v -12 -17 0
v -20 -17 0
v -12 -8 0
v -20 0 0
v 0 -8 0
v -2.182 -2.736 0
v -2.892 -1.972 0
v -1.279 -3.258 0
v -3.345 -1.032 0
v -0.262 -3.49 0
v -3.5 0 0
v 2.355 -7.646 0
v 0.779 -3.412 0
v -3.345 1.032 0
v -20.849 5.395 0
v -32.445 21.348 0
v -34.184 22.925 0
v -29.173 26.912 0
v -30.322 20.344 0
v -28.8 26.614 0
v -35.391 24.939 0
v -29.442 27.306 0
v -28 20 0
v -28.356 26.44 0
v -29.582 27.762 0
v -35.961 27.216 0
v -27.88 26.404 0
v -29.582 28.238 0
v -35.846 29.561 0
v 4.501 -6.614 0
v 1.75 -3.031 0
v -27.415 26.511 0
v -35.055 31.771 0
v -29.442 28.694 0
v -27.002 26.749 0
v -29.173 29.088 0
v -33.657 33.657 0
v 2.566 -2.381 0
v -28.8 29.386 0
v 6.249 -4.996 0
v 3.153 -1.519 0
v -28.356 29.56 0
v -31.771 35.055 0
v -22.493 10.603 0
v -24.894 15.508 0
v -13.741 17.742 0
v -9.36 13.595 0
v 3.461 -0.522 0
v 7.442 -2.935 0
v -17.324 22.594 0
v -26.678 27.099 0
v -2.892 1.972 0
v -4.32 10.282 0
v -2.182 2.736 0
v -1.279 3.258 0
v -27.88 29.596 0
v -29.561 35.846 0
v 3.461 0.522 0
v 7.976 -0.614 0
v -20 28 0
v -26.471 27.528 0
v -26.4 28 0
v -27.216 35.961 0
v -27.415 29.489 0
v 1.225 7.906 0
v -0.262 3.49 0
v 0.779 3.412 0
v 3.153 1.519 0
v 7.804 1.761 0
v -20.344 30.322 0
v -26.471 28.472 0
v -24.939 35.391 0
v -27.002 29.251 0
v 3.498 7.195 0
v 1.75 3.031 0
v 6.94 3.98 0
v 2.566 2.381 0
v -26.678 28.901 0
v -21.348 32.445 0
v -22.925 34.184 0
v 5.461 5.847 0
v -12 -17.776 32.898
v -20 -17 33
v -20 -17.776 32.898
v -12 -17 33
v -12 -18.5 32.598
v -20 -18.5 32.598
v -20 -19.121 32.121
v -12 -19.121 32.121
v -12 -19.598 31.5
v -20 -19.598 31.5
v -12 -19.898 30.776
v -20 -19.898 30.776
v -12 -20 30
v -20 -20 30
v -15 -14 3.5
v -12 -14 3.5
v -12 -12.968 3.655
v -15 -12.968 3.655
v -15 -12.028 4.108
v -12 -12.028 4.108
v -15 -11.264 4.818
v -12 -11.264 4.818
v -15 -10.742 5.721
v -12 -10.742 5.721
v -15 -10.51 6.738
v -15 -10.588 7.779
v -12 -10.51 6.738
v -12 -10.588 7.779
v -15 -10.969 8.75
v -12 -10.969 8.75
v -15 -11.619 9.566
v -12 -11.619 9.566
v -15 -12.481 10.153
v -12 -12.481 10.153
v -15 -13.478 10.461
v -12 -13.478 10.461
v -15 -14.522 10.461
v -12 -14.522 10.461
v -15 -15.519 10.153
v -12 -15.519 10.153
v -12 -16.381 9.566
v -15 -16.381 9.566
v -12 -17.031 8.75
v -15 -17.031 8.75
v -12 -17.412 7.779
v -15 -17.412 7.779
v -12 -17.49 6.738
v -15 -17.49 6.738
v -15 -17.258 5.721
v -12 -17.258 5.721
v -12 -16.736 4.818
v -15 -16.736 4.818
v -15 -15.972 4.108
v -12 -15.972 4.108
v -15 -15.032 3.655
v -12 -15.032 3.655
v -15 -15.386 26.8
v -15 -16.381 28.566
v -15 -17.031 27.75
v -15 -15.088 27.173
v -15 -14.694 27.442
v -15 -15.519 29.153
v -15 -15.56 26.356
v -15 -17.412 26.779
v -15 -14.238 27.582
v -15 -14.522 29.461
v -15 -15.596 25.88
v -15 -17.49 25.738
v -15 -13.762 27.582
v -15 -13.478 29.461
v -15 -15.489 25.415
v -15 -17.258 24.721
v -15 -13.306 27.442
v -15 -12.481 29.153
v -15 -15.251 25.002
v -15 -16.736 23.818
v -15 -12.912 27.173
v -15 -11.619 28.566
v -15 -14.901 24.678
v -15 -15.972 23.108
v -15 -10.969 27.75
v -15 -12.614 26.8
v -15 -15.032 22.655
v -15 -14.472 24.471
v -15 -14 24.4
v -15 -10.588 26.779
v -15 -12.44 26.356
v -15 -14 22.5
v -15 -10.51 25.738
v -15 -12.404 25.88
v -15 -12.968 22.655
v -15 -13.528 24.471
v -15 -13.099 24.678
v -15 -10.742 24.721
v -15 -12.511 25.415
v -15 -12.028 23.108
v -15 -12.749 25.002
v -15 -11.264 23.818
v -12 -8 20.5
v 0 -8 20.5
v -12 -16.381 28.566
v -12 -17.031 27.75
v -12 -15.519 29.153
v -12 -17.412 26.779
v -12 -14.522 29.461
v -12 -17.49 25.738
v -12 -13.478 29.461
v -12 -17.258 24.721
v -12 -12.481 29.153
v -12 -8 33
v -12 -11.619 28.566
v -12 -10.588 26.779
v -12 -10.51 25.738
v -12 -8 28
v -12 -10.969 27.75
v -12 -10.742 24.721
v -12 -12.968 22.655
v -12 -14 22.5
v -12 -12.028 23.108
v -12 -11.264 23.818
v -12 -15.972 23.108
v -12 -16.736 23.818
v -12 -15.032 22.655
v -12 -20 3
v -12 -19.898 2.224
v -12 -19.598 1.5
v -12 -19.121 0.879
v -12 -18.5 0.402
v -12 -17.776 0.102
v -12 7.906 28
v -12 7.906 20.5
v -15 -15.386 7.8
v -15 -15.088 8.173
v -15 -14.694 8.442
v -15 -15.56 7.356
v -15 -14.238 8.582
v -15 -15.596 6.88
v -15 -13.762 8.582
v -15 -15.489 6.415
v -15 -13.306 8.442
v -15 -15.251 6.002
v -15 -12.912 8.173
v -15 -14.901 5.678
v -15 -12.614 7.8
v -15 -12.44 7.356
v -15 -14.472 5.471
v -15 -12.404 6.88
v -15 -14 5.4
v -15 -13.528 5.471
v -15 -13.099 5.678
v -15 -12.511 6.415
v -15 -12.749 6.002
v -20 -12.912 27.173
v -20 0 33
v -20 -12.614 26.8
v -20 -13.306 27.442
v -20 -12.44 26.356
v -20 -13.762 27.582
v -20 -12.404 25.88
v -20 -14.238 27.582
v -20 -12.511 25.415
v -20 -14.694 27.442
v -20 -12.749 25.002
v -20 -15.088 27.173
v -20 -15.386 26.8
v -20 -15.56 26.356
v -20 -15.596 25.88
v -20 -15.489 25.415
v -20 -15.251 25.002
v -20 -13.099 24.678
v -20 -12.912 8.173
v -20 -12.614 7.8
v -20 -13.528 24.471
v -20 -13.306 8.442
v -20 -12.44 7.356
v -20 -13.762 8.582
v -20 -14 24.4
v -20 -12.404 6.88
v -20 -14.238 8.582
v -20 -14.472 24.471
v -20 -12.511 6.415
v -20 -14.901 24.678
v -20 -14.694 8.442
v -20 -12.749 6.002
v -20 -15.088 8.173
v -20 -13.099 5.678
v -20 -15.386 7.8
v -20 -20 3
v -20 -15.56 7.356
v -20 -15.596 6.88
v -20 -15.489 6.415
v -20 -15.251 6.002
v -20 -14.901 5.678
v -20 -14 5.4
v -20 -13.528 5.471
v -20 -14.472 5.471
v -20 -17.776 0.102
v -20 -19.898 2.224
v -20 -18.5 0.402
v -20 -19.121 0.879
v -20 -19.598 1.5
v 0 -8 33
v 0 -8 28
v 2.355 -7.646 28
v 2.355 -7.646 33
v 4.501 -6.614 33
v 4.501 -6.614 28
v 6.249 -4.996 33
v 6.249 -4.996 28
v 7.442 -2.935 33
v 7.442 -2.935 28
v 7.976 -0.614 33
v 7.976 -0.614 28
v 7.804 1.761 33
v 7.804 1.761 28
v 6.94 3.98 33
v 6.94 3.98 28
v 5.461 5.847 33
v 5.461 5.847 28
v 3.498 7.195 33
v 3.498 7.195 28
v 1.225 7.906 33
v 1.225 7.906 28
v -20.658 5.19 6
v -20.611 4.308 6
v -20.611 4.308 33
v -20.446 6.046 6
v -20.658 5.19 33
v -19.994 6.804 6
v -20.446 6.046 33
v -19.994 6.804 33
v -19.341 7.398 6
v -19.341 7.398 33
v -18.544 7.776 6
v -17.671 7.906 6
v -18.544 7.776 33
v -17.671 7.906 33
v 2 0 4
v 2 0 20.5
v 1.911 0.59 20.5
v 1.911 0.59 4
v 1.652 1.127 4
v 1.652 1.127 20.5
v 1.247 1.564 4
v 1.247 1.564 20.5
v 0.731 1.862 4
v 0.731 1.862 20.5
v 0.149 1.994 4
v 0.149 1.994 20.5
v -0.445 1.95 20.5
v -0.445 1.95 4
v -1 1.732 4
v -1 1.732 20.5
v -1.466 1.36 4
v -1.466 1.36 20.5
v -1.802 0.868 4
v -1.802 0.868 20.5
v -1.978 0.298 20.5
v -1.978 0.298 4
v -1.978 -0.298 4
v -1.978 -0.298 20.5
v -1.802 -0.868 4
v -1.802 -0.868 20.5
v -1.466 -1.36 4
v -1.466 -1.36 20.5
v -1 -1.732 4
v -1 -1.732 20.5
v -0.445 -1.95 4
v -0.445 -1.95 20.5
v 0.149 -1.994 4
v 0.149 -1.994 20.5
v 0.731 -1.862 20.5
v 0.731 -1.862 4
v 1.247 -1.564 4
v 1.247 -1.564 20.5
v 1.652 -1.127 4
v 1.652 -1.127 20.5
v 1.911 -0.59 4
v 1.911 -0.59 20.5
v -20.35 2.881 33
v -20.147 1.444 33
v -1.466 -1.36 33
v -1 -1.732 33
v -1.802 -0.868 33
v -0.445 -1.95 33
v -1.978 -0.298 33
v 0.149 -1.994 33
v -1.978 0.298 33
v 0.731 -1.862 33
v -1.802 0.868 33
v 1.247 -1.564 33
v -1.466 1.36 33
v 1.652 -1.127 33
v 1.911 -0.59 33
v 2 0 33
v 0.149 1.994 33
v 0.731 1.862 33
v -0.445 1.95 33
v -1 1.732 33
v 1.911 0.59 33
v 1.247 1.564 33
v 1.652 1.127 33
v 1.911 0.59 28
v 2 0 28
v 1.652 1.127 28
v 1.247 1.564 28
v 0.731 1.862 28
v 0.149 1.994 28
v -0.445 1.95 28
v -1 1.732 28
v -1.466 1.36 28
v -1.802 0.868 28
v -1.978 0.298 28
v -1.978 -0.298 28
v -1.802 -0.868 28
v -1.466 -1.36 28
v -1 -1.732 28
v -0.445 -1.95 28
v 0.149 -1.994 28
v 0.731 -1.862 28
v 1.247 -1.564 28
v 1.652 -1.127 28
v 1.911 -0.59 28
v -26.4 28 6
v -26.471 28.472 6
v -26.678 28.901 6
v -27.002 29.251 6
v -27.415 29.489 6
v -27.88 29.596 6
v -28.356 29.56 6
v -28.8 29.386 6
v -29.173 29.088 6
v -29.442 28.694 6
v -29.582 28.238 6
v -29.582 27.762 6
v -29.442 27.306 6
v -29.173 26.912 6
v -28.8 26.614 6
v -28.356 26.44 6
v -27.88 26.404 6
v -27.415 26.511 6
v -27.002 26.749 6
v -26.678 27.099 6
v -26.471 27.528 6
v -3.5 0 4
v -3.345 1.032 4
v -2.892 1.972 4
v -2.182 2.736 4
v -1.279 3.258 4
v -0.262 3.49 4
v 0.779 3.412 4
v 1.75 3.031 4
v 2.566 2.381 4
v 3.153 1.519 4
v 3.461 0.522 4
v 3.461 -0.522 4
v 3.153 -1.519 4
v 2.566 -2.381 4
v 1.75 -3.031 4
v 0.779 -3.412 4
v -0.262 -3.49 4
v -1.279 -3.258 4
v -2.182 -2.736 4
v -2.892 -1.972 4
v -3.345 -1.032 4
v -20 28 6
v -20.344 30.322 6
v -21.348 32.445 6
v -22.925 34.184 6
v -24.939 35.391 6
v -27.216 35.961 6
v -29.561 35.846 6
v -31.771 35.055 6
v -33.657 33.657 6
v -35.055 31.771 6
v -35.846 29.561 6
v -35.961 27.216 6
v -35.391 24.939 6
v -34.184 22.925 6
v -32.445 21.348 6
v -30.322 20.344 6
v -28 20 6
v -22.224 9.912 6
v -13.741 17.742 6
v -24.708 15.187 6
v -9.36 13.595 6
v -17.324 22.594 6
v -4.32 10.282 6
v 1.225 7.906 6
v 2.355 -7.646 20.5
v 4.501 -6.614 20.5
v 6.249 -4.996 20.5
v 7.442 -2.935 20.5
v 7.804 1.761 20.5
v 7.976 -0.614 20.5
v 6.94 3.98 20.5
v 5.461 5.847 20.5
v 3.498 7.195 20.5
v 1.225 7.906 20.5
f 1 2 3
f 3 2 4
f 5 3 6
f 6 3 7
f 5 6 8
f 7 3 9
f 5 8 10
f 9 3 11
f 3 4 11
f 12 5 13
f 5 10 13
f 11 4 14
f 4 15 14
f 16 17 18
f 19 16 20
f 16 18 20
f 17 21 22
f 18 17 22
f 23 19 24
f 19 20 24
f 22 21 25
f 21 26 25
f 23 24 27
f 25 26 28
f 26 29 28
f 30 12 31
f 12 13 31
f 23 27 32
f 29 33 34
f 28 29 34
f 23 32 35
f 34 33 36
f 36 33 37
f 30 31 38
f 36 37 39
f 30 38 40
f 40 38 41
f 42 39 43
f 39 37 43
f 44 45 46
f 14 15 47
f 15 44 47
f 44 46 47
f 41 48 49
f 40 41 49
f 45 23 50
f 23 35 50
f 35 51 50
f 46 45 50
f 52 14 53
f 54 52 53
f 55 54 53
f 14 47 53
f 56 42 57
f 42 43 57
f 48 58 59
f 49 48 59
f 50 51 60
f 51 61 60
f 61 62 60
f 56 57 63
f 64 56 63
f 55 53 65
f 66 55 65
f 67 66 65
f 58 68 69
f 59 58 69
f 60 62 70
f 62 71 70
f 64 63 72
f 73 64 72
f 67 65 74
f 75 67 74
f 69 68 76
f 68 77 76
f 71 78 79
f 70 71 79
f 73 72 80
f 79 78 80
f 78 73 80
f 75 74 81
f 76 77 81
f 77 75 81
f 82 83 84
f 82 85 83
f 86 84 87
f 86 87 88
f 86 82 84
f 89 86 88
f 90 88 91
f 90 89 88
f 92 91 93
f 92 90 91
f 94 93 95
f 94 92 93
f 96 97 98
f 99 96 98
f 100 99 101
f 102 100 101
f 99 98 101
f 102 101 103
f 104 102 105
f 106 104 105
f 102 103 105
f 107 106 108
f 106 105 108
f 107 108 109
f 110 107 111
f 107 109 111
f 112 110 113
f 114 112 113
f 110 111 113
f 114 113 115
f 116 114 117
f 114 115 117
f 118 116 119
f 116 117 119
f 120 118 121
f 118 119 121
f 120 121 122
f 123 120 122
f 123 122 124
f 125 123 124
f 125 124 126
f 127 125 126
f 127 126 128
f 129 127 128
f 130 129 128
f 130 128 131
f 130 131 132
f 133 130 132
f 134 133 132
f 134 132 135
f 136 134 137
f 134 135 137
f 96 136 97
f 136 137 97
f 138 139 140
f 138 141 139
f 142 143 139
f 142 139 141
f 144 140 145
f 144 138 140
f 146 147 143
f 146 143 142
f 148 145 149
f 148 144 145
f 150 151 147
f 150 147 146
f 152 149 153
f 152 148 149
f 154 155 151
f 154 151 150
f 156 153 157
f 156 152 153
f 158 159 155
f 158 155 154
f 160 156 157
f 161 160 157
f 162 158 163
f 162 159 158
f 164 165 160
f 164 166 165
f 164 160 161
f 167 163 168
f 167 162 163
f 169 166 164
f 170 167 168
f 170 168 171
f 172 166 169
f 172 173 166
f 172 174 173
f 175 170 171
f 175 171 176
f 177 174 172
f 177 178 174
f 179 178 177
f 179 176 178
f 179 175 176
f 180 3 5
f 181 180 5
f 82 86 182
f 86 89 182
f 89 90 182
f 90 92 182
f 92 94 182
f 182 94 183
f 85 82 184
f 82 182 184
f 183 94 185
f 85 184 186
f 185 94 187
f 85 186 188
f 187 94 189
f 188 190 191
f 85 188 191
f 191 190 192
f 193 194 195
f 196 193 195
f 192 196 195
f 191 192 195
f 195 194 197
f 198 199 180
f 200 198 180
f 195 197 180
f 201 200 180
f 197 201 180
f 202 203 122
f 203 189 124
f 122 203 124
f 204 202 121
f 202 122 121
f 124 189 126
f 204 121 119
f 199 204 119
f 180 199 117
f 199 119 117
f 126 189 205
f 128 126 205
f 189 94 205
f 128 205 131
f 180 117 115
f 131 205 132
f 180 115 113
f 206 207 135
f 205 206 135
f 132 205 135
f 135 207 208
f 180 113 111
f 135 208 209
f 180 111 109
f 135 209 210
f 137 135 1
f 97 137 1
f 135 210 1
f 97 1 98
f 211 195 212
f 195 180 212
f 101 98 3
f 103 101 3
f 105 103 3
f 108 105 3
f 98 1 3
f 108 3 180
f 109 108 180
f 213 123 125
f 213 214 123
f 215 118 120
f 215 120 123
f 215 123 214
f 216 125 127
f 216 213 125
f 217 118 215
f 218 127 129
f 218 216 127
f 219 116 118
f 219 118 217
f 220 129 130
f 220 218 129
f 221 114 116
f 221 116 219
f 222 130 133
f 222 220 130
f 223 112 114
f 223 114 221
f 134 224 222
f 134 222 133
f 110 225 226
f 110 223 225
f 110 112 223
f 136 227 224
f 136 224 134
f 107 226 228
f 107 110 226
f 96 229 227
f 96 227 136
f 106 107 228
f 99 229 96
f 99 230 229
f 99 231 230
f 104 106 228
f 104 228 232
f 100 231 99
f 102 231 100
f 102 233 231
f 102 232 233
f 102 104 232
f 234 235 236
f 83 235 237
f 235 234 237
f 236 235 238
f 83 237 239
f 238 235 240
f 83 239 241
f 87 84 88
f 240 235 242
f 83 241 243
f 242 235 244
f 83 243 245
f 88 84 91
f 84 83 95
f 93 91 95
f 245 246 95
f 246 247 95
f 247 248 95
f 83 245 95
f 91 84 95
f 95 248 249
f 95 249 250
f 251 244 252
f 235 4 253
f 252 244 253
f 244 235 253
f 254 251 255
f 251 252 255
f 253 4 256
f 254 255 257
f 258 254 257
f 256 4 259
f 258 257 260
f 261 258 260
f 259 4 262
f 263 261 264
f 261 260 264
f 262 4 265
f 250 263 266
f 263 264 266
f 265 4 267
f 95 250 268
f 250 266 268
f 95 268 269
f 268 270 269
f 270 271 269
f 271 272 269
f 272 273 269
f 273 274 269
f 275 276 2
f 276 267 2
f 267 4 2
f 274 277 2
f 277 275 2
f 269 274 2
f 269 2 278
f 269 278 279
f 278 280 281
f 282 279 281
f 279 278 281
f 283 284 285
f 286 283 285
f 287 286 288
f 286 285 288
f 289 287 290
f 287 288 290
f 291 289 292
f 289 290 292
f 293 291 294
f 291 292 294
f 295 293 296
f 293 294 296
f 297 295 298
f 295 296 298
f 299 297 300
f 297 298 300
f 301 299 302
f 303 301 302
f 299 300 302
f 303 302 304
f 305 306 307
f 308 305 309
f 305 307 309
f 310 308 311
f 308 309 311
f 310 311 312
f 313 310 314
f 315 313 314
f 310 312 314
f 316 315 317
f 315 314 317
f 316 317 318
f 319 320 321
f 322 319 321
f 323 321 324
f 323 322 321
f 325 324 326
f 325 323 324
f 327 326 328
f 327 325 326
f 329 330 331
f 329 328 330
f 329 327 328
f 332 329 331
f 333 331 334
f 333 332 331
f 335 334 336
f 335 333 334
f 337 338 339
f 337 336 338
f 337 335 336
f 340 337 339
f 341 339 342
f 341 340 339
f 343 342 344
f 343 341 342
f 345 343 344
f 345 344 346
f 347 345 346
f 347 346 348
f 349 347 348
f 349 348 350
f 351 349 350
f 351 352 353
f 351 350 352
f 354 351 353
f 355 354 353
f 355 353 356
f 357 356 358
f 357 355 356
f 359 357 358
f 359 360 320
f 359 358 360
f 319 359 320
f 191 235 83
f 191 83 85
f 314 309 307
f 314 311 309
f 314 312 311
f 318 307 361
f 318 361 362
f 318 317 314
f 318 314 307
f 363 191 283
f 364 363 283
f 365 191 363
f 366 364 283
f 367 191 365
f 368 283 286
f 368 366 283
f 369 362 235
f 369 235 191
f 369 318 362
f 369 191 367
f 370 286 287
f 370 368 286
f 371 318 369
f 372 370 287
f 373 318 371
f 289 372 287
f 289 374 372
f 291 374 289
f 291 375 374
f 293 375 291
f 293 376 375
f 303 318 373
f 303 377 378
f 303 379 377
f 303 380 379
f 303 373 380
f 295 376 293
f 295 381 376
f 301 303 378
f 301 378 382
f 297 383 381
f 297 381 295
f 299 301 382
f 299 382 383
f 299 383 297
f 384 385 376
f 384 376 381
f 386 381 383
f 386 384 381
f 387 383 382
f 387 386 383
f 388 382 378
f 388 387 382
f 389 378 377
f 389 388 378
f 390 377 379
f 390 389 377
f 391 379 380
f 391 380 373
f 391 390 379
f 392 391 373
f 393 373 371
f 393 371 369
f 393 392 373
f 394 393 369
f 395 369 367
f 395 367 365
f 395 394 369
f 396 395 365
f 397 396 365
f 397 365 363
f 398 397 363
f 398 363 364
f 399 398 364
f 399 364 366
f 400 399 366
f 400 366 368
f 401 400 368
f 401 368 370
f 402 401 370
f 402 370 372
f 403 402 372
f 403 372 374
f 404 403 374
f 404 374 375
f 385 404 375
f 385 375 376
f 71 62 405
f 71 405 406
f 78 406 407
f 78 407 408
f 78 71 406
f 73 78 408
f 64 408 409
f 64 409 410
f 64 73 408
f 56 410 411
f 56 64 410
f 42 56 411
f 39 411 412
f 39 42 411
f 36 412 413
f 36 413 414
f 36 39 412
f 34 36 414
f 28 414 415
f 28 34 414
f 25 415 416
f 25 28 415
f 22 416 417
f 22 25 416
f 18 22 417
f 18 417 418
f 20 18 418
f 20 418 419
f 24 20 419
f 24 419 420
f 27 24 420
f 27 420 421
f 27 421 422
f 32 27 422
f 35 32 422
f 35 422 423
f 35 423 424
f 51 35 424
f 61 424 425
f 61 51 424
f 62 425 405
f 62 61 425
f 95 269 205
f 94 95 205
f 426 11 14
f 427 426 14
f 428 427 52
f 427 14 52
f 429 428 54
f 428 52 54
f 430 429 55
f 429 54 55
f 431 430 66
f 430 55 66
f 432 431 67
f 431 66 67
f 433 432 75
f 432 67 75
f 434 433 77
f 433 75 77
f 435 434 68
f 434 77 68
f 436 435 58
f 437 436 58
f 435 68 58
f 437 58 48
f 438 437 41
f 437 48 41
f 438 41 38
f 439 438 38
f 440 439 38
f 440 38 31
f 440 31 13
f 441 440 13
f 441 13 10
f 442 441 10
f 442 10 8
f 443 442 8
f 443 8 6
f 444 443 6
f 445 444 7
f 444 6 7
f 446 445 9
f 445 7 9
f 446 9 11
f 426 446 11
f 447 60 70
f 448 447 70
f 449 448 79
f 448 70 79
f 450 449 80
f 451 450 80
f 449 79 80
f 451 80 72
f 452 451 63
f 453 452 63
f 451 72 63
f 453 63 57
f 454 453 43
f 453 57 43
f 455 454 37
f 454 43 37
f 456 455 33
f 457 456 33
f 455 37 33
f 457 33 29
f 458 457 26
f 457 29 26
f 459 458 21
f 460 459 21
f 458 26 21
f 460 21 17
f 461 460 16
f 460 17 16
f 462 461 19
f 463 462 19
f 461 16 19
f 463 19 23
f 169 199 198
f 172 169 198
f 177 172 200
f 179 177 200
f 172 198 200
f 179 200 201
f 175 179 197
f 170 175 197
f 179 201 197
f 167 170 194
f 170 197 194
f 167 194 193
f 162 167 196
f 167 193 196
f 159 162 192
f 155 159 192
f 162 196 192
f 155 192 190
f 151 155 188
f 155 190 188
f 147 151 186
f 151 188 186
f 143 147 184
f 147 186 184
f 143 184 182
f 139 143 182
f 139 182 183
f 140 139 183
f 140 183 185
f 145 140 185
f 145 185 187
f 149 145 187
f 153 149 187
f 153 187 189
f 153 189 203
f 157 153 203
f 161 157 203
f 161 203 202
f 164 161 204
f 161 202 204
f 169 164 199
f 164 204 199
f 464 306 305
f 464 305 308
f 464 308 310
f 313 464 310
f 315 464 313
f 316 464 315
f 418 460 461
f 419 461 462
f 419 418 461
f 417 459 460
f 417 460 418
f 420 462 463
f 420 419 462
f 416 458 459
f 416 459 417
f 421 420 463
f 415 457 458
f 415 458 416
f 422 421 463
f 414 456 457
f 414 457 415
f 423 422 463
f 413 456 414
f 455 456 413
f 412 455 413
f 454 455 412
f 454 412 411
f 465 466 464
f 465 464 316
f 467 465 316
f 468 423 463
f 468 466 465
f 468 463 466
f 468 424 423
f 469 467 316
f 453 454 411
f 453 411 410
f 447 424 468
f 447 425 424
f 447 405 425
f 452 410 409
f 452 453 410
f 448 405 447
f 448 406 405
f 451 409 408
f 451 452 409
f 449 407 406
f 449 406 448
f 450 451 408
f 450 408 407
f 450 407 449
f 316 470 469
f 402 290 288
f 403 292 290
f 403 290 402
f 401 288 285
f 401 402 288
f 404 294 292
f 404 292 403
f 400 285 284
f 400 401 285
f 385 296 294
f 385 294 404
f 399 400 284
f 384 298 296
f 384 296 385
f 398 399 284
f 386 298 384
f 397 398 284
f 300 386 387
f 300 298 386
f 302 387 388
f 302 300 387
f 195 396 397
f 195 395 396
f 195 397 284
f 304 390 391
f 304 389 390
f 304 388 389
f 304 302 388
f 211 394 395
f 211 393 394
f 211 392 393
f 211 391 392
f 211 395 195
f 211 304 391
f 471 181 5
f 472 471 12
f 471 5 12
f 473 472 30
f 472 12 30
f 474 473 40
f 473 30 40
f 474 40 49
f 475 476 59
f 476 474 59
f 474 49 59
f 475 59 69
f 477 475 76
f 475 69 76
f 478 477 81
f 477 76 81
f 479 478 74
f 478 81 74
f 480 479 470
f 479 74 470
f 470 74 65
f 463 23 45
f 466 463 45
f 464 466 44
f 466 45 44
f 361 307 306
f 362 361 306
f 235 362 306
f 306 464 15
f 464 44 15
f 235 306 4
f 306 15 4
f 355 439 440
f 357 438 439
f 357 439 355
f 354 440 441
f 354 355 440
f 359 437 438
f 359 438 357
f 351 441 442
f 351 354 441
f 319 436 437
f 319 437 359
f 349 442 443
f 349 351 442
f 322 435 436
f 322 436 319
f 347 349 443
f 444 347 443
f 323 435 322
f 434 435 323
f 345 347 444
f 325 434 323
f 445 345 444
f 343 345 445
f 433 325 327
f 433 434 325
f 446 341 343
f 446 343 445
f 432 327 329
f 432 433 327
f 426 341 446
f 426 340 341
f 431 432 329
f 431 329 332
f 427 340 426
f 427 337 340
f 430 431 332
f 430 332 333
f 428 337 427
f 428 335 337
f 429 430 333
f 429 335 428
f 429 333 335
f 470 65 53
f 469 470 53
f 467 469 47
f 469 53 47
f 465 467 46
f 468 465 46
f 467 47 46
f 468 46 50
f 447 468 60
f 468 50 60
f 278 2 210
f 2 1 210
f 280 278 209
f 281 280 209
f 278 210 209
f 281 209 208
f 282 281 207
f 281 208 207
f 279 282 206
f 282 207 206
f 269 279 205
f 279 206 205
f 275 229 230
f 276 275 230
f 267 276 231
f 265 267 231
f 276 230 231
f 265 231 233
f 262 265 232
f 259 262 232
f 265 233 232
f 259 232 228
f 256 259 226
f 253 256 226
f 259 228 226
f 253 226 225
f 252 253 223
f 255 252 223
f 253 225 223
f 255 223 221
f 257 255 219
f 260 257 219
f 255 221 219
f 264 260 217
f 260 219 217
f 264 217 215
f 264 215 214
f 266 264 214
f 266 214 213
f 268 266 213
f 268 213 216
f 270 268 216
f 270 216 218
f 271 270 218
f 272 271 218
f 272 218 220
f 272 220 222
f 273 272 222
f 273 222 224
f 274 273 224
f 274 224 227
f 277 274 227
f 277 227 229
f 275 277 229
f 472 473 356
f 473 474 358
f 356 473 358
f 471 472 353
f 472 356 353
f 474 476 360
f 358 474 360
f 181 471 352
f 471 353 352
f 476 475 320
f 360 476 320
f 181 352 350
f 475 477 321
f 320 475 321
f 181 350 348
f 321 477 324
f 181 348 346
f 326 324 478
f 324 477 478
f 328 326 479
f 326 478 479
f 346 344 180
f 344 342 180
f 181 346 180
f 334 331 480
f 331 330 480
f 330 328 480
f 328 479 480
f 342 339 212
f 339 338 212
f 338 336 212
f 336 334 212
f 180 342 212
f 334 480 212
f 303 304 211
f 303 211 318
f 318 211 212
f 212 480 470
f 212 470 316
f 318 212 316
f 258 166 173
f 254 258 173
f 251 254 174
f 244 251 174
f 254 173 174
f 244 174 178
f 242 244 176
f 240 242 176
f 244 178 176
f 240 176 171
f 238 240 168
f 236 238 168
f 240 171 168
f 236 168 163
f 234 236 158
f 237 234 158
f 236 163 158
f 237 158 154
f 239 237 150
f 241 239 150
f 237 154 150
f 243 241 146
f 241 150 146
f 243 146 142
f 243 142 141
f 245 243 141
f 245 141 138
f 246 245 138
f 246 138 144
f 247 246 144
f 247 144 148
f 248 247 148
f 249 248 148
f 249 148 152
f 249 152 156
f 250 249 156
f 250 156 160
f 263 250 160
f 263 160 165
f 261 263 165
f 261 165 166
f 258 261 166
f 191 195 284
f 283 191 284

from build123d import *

# Parameters (mm, degrees)
SKETCH1_R           = 2
SKETCH1_R_2         = 1.6
BOSS_EXTRUDE6_DEPTH = 6
SKETCH1_6_R         = 2
BOSS_EXTRUDE7_DEPTH = 33
CUT_EXTRUDE1_START  = -12.5
CUT_EXTRUDE1_DEPTH  = 7.5
FILLET1_R           = 3
SKETCH3_R           = 1.6
CUT_EXTRUDE2_DEPTH  = 17.5
SKETCH4_R           = 3.5
SKETCH4_R_2         = 1.6
CUT_EXTRUDE3_DEPTH  = 3
FILLET2_R           = 3
SKETCH5_R           = 3.5
CUT_EXTRUDE6_DEPTH  = 4


with BuildPart() as part:
    # Sketch1 → Boss-Extrude6 (new body)
    with BuildSketch(Plane.XY):
        with BuildLine():
            Line((-12, -8), (0, -8))
            ThreePointArc((0, -8), (7.976389989, -0.614168335), (1.22471154, 7.905699314))
            ThreePointArc((1.22471154, 7.905699314), (-11.642163109, 15.571502149), (-20, 28))
            ThreePointArc((-20, 28), (-33.656854249, 33.656854249), (-28, 20))
            ThreePointArc((-28, 20), (-22.4925387, 10.60298452), (-20, 0))
            Line((-20, 0), (-20, -20))
            Line((-20, -20), (-12, -20))
            Line((-12, -20), (-12, -8))
        make_face()
        Circle(SKETCH1_R, mode=Mode.SUBTRACT)
        with Locations((-28, 28)):
            Circle(SKETCH1_R_2, mode=Mode.SUBTRACT)
    extrude(amount=BOSS_EXTRUDE6_DEPTH)

    # Sketch1<6> → Boss-Extrude7 (add)
    with BuildSketch(Plane.XY):
        with BuildLine():
            Line((-12, -8), (0, -8))
            ThreePointArc((0, -8), (7.976389989, -0.614168335), (1.22471154, 7.905699314))
            Line((1.22471154, 7.905699314), (-21.534392451, 7.905699314))
            ThreePointArc((-21.534392451, 7.905699314), (-20.548705212, 3.995255894), (-20, 0))
            Line((-20, 0), (-20, -20))
            Line((-20, -20), (-12, -20))
            Line((-12, -20), (-12, -8))
        make_face()
        Circle(SKETCH1_6_R, mode=Mode.SUBTRACT)
    extrude(amount=BOSS_EXTRUDE7_DEPTH)

    # Sketch2 → Cut-Extrude1 (cut)
    with BuildSketch(Plane.XY.offset(33).offset(CUT_EXTRUDE1_START)):
        with BuildLine():
            Line((-12, -8), (-12, 7.905699314))
            Line((-12, 7.905699314), (1.22471154, 7.905699314))
            ThreePointArc((1.22471154, 7.905699314), (7.976389989, -0.614168335), (0, -8))
            Line((0, -8), (-12, -8))
        make_face()
    extrude(amount=CUT_EXTRUDE1_DEPTH, mode=Mode.SUBTRACT)

    # Fillet1
    fillet1_edges = [part.edges().sort_by_distance(p)[0] for p in [
        (-16, -20, 33),
        (-16, -20, 0),
    ]]
    fillet(fillet1_edges, radius=FILLET1_R)

    # Sketch3 → Cut-Extrude2 (cut)
    with BuildSketch(Plane(origin=(-12, 0, 0), x_dir=(0, 0, -1), z_dir=(1, 0, 0))):
        with Locations((-26, -14)):
            Circle(SKETCH3_R)
        with Locations((-7, -14)):
            Circle(SKETCH3_R)
    extrude(amount=-CUT_EXTRUDE2_DEPTH, mode=Mode.SUBTRACT)

    # Sketch4 → Cut-Extrude3 (cut)
    # profile 1 of 2: a face of its own
    with BuildSketch(Plane(origin=(-12, 0, 0), x_dir=(0, 0, -1), z_dir=(1, 0, 0))):
        with Locations((-26, -14)):
            Circle(SKETCH4_R)
        with Locations((-26, -14)):
            Circle(SKETCH4_R_2, mode=Mode.SUBTRACT)
    # profile 2 of 2: a face of its own
    with BuildSketch(Plane(origin=(-12, 0, 0), x_dir=(0, 0, -1), z_dir=(1, 0, 0))):
        with Locations((-7, -14)):
            Circle(SKETCH4_R)
    extrude(amount=-CUT_EXTRUDE3_DEPTH, mode=Mode.SUBTRACT)

    # Fillet2
    fillet2_edges = [part.edges().sort_by_distance(p)[0] for p in [
        (-21.534392451, 7.905699314, 19.5),
    ]]
    fillet(fillet2_edges, radius=FILLET2_R)

    # Sketch5 → Cut-Extrude6 (cut)
    with BuildSketch(Plane(origin=(0, 0, 0), x_dir=(-1, 0, 0), z_dir=(0, 0, -1))):
        Circle(SKETCH5_R)
    extrude(amount=-CUT_EXTRUDE6_DEPTH, mode=Mode.SUBTRACT)


solid = part.part
